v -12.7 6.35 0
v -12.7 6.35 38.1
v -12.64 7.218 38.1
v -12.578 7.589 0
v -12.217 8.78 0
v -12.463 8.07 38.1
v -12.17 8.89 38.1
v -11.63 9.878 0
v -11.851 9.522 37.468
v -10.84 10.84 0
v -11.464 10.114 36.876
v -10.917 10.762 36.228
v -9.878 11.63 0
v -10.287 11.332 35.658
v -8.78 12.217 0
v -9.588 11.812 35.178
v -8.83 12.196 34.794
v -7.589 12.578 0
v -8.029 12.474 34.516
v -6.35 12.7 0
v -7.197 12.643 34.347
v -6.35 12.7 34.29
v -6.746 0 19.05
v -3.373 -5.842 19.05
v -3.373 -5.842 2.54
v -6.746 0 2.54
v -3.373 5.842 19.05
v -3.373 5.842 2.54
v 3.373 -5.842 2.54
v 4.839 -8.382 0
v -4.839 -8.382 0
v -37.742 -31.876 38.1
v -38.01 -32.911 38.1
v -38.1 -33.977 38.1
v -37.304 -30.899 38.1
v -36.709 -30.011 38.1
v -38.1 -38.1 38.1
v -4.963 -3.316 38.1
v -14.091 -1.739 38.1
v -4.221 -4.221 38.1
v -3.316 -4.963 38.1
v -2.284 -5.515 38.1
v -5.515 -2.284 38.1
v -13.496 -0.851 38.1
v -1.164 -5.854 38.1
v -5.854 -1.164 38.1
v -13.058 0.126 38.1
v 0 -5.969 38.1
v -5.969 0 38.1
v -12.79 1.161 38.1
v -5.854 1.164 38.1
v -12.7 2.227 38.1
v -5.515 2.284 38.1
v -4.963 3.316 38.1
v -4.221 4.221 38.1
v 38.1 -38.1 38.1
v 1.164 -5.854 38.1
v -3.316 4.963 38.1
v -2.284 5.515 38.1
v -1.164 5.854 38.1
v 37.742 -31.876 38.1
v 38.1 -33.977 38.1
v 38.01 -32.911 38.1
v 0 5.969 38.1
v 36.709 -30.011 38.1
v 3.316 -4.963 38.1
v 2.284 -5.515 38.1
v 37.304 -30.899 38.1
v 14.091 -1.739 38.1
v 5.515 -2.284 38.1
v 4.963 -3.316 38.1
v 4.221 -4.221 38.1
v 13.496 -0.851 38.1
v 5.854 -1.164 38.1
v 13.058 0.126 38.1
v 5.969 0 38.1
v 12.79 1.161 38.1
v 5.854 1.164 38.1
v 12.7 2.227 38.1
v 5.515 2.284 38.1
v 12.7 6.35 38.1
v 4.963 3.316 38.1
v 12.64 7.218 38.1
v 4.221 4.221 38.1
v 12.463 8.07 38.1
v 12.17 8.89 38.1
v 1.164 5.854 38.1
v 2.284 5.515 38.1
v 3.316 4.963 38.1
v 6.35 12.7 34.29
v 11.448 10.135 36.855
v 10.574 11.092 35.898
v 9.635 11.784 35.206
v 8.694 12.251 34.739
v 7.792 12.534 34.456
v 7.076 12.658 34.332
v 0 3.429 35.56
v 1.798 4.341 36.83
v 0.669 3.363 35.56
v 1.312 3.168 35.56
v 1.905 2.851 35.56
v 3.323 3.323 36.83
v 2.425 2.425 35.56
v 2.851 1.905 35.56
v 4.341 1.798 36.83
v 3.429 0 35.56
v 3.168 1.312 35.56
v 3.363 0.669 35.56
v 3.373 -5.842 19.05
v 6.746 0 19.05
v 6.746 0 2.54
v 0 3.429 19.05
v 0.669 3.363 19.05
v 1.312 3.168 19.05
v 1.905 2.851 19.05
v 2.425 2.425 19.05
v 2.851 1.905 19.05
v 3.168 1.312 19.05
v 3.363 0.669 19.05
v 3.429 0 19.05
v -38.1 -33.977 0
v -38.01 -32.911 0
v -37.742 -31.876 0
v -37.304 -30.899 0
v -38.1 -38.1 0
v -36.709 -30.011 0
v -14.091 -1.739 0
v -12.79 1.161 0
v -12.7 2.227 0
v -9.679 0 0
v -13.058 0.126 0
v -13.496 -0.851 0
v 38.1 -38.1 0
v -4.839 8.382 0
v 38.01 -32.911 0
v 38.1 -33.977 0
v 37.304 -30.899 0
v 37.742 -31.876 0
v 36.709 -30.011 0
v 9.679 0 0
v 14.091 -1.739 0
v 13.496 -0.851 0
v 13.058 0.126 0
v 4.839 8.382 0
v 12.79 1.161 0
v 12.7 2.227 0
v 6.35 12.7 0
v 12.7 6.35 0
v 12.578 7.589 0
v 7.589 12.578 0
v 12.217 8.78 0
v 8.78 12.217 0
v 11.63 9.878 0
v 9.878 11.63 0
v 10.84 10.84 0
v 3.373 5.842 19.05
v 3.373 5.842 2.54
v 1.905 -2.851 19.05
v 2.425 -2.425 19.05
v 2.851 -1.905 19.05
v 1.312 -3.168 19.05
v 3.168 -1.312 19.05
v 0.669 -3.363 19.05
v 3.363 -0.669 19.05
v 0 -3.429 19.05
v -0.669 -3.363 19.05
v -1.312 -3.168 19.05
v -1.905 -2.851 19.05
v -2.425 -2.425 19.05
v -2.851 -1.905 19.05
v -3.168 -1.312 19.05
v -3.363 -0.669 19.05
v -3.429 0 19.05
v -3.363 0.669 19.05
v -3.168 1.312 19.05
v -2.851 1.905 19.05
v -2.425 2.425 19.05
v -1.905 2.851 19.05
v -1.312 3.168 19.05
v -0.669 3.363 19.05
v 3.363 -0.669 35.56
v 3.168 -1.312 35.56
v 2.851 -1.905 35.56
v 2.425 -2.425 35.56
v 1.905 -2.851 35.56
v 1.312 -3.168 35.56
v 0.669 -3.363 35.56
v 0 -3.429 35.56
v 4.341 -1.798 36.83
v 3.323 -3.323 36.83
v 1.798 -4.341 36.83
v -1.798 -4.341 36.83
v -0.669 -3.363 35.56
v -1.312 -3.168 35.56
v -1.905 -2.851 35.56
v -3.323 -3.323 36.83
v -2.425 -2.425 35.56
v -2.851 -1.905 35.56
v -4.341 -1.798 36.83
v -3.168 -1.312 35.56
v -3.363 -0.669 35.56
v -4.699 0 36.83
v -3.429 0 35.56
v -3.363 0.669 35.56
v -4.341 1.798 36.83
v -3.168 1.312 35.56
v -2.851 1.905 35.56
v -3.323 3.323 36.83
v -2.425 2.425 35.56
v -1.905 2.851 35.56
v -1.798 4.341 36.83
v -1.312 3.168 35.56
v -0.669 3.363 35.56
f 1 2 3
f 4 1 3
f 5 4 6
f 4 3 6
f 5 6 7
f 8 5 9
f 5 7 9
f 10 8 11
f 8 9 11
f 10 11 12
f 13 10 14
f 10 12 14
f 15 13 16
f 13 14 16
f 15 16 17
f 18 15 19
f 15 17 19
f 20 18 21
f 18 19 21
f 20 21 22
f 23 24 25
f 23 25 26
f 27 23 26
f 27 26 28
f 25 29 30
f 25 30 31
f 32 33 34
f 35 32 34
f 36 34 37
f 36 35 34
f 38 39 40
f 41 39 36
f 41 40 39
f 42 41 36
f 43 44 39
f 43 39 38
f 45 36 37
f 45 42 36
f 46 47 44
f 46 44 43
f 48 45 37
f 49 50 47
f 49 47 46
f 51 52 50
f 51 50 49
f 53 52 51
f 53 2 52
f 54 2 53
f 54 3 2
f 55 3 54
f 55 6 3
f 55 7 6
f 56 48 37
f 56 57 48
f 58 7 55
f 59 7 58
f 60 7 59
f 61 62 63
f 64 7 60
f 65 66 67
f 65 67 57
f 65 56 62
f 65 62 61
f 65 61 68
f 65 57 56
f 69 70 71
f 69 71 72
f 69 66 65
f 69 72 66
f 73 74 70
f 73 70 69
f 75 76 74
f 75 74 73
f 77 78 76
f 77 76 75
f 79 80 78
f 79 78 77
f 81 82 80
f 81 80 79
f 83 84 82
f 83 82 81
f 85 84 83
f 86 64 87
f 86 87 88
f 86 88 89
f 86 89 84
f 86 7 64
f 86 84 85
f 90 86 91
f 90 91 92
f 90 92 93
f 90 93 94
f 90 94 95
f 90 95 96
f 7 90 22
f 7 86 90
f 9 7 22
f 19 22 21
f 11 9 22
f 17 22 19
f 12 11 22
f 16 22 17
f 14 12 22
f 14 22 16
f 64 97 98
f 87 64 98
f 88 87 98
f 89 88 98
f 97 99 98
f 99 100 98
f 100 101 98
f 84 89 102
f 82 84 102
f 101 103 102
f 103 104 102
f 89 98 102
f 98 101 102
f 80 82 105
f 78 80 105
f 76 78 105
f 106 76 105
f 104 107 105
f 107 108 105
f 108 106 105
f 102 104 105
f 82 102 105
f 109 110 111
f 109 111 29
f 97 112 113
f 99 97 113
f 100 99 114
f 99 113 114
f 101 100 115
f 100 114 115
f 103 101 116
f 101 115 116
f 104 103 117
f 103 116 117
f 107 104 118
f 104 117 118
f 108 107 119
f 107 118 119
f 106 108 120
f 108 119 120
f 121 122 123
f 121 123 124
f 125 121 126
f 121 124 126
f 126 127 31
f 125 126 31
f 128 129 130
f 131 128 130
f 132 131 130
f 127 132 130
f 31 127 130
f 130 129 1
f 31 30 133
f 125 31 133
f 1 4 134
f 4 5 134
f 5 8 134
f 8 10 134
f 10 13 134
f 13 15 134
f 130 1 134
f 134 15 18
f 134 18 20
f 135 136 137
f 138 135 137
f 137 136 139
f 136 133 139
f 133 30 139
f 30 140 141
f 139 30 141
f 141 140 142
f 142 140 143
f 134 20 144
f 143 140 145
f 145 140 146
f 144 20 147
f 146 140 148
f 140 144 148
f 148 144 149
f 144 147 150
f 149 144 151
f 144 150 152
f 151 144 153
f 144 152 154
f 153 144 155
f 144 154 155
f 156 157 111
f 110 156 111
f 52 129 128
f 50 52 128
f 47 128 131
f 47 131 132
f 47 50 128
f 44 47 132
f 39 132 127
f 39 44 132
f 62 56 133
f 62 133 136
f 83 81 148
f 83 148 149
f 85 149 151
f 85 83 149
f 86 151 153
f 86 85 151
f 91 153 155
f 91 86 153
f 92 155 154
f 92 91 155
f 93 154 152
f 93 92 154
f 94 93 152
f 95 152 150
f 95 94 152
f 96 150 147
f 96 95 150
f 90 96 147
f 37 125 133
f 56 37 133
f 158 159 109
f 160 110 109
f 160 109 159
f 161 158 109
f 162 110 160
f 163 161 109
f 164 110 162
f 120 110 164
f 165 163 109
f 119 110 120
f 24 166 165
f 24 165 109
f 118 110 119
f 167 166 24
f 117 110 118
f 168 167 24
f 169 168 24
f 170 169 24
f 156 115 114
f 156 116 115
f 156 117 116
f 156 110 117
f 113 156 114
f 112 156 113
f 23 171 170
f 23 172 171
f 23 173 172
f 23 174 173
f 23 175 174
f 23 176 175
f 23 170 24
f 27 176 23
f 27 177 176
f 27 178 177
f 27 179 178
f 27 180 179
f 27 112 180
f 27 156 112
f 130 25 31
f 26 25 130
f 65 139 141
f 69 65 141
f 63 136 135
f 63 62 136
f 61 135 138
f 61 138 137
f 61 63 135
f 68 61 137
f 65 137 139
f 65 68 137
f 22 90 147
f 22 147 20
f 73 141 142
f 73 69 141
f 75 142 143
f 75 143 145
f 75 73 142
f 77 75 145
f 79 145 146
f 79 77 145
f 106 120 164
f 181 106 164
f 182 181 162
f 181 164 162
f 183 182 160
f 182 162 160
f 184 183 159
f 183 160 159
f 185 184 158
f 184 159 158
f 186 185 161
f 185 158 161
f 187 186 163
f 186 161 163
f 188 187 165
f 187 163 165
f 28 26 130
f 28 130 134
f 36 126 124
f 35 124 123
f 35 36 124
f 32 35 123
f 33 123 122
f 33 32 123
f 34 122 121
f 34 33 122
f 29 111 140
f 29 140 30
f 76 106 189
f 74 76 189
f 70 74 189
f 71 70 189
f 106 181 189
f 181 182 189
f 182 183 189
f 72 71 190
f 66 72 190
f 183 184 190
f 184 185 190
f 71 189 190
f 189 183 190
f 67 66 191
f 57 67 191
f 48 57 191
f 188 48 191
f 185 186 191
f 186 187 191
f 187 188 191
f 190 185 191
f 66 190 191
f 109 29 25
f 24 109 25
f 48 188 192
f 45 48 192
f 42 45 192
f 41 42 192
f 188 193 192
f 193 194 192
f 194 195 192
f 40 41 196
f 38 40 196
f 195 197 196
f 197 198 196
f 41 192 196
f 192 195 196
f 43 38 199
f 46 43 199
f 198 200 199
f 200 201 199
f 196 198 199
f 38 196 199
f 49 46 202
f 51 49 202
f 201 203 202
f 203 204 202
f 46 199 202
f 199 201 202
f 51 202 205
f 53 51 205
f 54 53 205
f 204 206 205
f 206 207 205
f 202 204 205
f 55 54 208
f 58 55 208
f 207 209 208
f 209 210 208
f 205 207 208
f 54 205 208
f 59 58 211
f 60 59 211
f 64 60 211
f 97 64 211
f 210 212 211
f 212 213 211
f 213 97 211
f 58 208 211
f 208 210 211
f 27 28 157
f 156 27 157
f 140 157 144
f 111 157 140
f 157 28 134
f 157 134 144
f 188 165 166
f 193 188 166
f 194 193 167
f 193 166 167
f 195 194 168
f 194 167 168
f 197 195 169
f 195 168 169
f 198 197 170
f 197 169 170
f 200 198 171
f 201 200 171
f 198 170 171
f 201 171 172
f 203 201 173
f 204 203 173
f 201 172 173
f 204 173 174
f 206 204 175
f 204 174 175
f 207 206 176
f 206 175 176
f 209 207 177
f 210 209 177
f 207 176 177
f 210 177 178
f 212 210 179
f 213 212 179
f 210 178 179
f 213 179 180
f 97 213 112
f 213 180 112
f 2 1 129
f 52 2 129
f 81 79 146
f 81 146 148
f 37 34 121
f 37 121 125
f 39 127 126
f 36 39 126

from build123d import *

# Parameters (mm, degrees)
BOSS_EXTRUDE1_DEPTH = 38.1
CUT_EXTRUDE1_DEPTH  = 19.05
CHAMFER1_SIZE       = 2.54
CHAMFER2_SIZE       = 2.54
FILLET1_R           = 6.35
CHAMFER3_SIZE       = 3.81


with BuildPart() as part:
    # Sketch1 → Boss-Extrude1 (new body)
    with BuildSketch(Plane.XY):
        with BuildLine():
            Line((0, 3.429), (0, 12.7))
            Line((0, 12.7), (-12.7, 12.7))
            Line((-12.7, 12.7), (-12.7, 0))
            Line((-12.7, 0), (-38.1, -31.75))
            Line((-38.1, -31.75), (-38.1, -38.1))
            Line((-38.1, -38.1), (0, -38.1))
            Line((0, -38.1), (0, -3.429))
            ThreePointArc((0, -3.429), (-3.429, 0), (0, 3.429))
        make_face()
        with BuildLine():
            Line((12.7, 12.7), (0, 12.7))
            Line((0, 12.7), (0, 3.429))
            ThreePointArc((0, 3.429), (2.424669153, 2.424669153), (3.429, 0))
            ThreePointArc((3.429, 0), (2.424669153, -2.424669153), (0, -3.429))
            Line((0, -3.429), (0, -38.1))
            Line((0, -38.1), (38.1, -38.1))
            Line((38.1, -38.1), (38.1, -31.75))
            Line((38.1, -31.75), (12.7, 0))
            Line((12.7, 0), (12.7, 12.7))
        make_face()
    extrude(amount=BOSS_EXTRUDE1_DEPTH)

    # Sketch2 → Cut-Extrude1 (cut)
    with BuildSketch(Plane(origin=(0, 0, 0), x_dir=(-1, 0, 0), z_dir=(0, 0, -1))):
        Polygon((6.745760545, 0), (3.372880273, 5.842), (-3.372880273, 5.842), (-6.745760545, 0), (-3.372880273, -5.842), (3.372880273, -5.842), align=None)
    extrude(amount=-CUT_EXTRUDE1_DEPTH, mode=Mode.SUBTRACT)

    # Chamfer1
    chamfer1_edges = [part.edges().sort_by_distance(p)[0] for p in [
        (-5.059320409, -2.921, 0),
        (-5.059320409, 2.921, 0),
        (0, 5.842, 0),
        (5.059320409, 2.921, 0),
        (5.059320409, -2.921, 0),
        (0, -5.842, 0),
    ]]
    chamfer(chamfer1_edges, length=CHAMFER1_SIZE)

    # Chamfer2
    chamfer2_edges = [part.edges().sort_by_distance(p)[0] for p in [
        (0, 3.429, 38.1),
    ]]
    chamfer(chamfer2_edges, length=CHAMFER2_SIZE)

    # Fillet1
    fillet1_edges = [part.edges().sort_by_distance(p)[0] for p in [
        (12.7, 0, 19.05),
        (38.1, -31.75, 19.05),
        (-38.1, -31.75, 19.05),
        (-12.7, 0, 19.05),
        (-12.7, 12.7, 19.05),
        (12.7, 12.7, 19.05),
    ]]
    fillet(fillet1_edges, radius=FILLET1_R)

    # Chamfer3
    # the kernel refuses this chamfer: 3.81 mm, written as the material it takes off along each edge
    with BuildSketch(Plane(origin=(-16.148112184, 12.7, 38.1), x_dir=(0, -0.9996219169112968, 0.027495876610586386), z_dir=(1, 0, 0))) as chamfer3_piece_1:
        Polygon((CHAMFER3_SIZE * 0.999621916911, CHAMFER3_SIZE * 0.0274958766106), (-CHAMFER3_SIZE * 0.0274958766106, CHAMFER3_SIZE * 0.999621916911), (0, 0), align=None)
    extrude(amount=32.296224368, mode=Mode.SUBTRACT)


solid = part.part
